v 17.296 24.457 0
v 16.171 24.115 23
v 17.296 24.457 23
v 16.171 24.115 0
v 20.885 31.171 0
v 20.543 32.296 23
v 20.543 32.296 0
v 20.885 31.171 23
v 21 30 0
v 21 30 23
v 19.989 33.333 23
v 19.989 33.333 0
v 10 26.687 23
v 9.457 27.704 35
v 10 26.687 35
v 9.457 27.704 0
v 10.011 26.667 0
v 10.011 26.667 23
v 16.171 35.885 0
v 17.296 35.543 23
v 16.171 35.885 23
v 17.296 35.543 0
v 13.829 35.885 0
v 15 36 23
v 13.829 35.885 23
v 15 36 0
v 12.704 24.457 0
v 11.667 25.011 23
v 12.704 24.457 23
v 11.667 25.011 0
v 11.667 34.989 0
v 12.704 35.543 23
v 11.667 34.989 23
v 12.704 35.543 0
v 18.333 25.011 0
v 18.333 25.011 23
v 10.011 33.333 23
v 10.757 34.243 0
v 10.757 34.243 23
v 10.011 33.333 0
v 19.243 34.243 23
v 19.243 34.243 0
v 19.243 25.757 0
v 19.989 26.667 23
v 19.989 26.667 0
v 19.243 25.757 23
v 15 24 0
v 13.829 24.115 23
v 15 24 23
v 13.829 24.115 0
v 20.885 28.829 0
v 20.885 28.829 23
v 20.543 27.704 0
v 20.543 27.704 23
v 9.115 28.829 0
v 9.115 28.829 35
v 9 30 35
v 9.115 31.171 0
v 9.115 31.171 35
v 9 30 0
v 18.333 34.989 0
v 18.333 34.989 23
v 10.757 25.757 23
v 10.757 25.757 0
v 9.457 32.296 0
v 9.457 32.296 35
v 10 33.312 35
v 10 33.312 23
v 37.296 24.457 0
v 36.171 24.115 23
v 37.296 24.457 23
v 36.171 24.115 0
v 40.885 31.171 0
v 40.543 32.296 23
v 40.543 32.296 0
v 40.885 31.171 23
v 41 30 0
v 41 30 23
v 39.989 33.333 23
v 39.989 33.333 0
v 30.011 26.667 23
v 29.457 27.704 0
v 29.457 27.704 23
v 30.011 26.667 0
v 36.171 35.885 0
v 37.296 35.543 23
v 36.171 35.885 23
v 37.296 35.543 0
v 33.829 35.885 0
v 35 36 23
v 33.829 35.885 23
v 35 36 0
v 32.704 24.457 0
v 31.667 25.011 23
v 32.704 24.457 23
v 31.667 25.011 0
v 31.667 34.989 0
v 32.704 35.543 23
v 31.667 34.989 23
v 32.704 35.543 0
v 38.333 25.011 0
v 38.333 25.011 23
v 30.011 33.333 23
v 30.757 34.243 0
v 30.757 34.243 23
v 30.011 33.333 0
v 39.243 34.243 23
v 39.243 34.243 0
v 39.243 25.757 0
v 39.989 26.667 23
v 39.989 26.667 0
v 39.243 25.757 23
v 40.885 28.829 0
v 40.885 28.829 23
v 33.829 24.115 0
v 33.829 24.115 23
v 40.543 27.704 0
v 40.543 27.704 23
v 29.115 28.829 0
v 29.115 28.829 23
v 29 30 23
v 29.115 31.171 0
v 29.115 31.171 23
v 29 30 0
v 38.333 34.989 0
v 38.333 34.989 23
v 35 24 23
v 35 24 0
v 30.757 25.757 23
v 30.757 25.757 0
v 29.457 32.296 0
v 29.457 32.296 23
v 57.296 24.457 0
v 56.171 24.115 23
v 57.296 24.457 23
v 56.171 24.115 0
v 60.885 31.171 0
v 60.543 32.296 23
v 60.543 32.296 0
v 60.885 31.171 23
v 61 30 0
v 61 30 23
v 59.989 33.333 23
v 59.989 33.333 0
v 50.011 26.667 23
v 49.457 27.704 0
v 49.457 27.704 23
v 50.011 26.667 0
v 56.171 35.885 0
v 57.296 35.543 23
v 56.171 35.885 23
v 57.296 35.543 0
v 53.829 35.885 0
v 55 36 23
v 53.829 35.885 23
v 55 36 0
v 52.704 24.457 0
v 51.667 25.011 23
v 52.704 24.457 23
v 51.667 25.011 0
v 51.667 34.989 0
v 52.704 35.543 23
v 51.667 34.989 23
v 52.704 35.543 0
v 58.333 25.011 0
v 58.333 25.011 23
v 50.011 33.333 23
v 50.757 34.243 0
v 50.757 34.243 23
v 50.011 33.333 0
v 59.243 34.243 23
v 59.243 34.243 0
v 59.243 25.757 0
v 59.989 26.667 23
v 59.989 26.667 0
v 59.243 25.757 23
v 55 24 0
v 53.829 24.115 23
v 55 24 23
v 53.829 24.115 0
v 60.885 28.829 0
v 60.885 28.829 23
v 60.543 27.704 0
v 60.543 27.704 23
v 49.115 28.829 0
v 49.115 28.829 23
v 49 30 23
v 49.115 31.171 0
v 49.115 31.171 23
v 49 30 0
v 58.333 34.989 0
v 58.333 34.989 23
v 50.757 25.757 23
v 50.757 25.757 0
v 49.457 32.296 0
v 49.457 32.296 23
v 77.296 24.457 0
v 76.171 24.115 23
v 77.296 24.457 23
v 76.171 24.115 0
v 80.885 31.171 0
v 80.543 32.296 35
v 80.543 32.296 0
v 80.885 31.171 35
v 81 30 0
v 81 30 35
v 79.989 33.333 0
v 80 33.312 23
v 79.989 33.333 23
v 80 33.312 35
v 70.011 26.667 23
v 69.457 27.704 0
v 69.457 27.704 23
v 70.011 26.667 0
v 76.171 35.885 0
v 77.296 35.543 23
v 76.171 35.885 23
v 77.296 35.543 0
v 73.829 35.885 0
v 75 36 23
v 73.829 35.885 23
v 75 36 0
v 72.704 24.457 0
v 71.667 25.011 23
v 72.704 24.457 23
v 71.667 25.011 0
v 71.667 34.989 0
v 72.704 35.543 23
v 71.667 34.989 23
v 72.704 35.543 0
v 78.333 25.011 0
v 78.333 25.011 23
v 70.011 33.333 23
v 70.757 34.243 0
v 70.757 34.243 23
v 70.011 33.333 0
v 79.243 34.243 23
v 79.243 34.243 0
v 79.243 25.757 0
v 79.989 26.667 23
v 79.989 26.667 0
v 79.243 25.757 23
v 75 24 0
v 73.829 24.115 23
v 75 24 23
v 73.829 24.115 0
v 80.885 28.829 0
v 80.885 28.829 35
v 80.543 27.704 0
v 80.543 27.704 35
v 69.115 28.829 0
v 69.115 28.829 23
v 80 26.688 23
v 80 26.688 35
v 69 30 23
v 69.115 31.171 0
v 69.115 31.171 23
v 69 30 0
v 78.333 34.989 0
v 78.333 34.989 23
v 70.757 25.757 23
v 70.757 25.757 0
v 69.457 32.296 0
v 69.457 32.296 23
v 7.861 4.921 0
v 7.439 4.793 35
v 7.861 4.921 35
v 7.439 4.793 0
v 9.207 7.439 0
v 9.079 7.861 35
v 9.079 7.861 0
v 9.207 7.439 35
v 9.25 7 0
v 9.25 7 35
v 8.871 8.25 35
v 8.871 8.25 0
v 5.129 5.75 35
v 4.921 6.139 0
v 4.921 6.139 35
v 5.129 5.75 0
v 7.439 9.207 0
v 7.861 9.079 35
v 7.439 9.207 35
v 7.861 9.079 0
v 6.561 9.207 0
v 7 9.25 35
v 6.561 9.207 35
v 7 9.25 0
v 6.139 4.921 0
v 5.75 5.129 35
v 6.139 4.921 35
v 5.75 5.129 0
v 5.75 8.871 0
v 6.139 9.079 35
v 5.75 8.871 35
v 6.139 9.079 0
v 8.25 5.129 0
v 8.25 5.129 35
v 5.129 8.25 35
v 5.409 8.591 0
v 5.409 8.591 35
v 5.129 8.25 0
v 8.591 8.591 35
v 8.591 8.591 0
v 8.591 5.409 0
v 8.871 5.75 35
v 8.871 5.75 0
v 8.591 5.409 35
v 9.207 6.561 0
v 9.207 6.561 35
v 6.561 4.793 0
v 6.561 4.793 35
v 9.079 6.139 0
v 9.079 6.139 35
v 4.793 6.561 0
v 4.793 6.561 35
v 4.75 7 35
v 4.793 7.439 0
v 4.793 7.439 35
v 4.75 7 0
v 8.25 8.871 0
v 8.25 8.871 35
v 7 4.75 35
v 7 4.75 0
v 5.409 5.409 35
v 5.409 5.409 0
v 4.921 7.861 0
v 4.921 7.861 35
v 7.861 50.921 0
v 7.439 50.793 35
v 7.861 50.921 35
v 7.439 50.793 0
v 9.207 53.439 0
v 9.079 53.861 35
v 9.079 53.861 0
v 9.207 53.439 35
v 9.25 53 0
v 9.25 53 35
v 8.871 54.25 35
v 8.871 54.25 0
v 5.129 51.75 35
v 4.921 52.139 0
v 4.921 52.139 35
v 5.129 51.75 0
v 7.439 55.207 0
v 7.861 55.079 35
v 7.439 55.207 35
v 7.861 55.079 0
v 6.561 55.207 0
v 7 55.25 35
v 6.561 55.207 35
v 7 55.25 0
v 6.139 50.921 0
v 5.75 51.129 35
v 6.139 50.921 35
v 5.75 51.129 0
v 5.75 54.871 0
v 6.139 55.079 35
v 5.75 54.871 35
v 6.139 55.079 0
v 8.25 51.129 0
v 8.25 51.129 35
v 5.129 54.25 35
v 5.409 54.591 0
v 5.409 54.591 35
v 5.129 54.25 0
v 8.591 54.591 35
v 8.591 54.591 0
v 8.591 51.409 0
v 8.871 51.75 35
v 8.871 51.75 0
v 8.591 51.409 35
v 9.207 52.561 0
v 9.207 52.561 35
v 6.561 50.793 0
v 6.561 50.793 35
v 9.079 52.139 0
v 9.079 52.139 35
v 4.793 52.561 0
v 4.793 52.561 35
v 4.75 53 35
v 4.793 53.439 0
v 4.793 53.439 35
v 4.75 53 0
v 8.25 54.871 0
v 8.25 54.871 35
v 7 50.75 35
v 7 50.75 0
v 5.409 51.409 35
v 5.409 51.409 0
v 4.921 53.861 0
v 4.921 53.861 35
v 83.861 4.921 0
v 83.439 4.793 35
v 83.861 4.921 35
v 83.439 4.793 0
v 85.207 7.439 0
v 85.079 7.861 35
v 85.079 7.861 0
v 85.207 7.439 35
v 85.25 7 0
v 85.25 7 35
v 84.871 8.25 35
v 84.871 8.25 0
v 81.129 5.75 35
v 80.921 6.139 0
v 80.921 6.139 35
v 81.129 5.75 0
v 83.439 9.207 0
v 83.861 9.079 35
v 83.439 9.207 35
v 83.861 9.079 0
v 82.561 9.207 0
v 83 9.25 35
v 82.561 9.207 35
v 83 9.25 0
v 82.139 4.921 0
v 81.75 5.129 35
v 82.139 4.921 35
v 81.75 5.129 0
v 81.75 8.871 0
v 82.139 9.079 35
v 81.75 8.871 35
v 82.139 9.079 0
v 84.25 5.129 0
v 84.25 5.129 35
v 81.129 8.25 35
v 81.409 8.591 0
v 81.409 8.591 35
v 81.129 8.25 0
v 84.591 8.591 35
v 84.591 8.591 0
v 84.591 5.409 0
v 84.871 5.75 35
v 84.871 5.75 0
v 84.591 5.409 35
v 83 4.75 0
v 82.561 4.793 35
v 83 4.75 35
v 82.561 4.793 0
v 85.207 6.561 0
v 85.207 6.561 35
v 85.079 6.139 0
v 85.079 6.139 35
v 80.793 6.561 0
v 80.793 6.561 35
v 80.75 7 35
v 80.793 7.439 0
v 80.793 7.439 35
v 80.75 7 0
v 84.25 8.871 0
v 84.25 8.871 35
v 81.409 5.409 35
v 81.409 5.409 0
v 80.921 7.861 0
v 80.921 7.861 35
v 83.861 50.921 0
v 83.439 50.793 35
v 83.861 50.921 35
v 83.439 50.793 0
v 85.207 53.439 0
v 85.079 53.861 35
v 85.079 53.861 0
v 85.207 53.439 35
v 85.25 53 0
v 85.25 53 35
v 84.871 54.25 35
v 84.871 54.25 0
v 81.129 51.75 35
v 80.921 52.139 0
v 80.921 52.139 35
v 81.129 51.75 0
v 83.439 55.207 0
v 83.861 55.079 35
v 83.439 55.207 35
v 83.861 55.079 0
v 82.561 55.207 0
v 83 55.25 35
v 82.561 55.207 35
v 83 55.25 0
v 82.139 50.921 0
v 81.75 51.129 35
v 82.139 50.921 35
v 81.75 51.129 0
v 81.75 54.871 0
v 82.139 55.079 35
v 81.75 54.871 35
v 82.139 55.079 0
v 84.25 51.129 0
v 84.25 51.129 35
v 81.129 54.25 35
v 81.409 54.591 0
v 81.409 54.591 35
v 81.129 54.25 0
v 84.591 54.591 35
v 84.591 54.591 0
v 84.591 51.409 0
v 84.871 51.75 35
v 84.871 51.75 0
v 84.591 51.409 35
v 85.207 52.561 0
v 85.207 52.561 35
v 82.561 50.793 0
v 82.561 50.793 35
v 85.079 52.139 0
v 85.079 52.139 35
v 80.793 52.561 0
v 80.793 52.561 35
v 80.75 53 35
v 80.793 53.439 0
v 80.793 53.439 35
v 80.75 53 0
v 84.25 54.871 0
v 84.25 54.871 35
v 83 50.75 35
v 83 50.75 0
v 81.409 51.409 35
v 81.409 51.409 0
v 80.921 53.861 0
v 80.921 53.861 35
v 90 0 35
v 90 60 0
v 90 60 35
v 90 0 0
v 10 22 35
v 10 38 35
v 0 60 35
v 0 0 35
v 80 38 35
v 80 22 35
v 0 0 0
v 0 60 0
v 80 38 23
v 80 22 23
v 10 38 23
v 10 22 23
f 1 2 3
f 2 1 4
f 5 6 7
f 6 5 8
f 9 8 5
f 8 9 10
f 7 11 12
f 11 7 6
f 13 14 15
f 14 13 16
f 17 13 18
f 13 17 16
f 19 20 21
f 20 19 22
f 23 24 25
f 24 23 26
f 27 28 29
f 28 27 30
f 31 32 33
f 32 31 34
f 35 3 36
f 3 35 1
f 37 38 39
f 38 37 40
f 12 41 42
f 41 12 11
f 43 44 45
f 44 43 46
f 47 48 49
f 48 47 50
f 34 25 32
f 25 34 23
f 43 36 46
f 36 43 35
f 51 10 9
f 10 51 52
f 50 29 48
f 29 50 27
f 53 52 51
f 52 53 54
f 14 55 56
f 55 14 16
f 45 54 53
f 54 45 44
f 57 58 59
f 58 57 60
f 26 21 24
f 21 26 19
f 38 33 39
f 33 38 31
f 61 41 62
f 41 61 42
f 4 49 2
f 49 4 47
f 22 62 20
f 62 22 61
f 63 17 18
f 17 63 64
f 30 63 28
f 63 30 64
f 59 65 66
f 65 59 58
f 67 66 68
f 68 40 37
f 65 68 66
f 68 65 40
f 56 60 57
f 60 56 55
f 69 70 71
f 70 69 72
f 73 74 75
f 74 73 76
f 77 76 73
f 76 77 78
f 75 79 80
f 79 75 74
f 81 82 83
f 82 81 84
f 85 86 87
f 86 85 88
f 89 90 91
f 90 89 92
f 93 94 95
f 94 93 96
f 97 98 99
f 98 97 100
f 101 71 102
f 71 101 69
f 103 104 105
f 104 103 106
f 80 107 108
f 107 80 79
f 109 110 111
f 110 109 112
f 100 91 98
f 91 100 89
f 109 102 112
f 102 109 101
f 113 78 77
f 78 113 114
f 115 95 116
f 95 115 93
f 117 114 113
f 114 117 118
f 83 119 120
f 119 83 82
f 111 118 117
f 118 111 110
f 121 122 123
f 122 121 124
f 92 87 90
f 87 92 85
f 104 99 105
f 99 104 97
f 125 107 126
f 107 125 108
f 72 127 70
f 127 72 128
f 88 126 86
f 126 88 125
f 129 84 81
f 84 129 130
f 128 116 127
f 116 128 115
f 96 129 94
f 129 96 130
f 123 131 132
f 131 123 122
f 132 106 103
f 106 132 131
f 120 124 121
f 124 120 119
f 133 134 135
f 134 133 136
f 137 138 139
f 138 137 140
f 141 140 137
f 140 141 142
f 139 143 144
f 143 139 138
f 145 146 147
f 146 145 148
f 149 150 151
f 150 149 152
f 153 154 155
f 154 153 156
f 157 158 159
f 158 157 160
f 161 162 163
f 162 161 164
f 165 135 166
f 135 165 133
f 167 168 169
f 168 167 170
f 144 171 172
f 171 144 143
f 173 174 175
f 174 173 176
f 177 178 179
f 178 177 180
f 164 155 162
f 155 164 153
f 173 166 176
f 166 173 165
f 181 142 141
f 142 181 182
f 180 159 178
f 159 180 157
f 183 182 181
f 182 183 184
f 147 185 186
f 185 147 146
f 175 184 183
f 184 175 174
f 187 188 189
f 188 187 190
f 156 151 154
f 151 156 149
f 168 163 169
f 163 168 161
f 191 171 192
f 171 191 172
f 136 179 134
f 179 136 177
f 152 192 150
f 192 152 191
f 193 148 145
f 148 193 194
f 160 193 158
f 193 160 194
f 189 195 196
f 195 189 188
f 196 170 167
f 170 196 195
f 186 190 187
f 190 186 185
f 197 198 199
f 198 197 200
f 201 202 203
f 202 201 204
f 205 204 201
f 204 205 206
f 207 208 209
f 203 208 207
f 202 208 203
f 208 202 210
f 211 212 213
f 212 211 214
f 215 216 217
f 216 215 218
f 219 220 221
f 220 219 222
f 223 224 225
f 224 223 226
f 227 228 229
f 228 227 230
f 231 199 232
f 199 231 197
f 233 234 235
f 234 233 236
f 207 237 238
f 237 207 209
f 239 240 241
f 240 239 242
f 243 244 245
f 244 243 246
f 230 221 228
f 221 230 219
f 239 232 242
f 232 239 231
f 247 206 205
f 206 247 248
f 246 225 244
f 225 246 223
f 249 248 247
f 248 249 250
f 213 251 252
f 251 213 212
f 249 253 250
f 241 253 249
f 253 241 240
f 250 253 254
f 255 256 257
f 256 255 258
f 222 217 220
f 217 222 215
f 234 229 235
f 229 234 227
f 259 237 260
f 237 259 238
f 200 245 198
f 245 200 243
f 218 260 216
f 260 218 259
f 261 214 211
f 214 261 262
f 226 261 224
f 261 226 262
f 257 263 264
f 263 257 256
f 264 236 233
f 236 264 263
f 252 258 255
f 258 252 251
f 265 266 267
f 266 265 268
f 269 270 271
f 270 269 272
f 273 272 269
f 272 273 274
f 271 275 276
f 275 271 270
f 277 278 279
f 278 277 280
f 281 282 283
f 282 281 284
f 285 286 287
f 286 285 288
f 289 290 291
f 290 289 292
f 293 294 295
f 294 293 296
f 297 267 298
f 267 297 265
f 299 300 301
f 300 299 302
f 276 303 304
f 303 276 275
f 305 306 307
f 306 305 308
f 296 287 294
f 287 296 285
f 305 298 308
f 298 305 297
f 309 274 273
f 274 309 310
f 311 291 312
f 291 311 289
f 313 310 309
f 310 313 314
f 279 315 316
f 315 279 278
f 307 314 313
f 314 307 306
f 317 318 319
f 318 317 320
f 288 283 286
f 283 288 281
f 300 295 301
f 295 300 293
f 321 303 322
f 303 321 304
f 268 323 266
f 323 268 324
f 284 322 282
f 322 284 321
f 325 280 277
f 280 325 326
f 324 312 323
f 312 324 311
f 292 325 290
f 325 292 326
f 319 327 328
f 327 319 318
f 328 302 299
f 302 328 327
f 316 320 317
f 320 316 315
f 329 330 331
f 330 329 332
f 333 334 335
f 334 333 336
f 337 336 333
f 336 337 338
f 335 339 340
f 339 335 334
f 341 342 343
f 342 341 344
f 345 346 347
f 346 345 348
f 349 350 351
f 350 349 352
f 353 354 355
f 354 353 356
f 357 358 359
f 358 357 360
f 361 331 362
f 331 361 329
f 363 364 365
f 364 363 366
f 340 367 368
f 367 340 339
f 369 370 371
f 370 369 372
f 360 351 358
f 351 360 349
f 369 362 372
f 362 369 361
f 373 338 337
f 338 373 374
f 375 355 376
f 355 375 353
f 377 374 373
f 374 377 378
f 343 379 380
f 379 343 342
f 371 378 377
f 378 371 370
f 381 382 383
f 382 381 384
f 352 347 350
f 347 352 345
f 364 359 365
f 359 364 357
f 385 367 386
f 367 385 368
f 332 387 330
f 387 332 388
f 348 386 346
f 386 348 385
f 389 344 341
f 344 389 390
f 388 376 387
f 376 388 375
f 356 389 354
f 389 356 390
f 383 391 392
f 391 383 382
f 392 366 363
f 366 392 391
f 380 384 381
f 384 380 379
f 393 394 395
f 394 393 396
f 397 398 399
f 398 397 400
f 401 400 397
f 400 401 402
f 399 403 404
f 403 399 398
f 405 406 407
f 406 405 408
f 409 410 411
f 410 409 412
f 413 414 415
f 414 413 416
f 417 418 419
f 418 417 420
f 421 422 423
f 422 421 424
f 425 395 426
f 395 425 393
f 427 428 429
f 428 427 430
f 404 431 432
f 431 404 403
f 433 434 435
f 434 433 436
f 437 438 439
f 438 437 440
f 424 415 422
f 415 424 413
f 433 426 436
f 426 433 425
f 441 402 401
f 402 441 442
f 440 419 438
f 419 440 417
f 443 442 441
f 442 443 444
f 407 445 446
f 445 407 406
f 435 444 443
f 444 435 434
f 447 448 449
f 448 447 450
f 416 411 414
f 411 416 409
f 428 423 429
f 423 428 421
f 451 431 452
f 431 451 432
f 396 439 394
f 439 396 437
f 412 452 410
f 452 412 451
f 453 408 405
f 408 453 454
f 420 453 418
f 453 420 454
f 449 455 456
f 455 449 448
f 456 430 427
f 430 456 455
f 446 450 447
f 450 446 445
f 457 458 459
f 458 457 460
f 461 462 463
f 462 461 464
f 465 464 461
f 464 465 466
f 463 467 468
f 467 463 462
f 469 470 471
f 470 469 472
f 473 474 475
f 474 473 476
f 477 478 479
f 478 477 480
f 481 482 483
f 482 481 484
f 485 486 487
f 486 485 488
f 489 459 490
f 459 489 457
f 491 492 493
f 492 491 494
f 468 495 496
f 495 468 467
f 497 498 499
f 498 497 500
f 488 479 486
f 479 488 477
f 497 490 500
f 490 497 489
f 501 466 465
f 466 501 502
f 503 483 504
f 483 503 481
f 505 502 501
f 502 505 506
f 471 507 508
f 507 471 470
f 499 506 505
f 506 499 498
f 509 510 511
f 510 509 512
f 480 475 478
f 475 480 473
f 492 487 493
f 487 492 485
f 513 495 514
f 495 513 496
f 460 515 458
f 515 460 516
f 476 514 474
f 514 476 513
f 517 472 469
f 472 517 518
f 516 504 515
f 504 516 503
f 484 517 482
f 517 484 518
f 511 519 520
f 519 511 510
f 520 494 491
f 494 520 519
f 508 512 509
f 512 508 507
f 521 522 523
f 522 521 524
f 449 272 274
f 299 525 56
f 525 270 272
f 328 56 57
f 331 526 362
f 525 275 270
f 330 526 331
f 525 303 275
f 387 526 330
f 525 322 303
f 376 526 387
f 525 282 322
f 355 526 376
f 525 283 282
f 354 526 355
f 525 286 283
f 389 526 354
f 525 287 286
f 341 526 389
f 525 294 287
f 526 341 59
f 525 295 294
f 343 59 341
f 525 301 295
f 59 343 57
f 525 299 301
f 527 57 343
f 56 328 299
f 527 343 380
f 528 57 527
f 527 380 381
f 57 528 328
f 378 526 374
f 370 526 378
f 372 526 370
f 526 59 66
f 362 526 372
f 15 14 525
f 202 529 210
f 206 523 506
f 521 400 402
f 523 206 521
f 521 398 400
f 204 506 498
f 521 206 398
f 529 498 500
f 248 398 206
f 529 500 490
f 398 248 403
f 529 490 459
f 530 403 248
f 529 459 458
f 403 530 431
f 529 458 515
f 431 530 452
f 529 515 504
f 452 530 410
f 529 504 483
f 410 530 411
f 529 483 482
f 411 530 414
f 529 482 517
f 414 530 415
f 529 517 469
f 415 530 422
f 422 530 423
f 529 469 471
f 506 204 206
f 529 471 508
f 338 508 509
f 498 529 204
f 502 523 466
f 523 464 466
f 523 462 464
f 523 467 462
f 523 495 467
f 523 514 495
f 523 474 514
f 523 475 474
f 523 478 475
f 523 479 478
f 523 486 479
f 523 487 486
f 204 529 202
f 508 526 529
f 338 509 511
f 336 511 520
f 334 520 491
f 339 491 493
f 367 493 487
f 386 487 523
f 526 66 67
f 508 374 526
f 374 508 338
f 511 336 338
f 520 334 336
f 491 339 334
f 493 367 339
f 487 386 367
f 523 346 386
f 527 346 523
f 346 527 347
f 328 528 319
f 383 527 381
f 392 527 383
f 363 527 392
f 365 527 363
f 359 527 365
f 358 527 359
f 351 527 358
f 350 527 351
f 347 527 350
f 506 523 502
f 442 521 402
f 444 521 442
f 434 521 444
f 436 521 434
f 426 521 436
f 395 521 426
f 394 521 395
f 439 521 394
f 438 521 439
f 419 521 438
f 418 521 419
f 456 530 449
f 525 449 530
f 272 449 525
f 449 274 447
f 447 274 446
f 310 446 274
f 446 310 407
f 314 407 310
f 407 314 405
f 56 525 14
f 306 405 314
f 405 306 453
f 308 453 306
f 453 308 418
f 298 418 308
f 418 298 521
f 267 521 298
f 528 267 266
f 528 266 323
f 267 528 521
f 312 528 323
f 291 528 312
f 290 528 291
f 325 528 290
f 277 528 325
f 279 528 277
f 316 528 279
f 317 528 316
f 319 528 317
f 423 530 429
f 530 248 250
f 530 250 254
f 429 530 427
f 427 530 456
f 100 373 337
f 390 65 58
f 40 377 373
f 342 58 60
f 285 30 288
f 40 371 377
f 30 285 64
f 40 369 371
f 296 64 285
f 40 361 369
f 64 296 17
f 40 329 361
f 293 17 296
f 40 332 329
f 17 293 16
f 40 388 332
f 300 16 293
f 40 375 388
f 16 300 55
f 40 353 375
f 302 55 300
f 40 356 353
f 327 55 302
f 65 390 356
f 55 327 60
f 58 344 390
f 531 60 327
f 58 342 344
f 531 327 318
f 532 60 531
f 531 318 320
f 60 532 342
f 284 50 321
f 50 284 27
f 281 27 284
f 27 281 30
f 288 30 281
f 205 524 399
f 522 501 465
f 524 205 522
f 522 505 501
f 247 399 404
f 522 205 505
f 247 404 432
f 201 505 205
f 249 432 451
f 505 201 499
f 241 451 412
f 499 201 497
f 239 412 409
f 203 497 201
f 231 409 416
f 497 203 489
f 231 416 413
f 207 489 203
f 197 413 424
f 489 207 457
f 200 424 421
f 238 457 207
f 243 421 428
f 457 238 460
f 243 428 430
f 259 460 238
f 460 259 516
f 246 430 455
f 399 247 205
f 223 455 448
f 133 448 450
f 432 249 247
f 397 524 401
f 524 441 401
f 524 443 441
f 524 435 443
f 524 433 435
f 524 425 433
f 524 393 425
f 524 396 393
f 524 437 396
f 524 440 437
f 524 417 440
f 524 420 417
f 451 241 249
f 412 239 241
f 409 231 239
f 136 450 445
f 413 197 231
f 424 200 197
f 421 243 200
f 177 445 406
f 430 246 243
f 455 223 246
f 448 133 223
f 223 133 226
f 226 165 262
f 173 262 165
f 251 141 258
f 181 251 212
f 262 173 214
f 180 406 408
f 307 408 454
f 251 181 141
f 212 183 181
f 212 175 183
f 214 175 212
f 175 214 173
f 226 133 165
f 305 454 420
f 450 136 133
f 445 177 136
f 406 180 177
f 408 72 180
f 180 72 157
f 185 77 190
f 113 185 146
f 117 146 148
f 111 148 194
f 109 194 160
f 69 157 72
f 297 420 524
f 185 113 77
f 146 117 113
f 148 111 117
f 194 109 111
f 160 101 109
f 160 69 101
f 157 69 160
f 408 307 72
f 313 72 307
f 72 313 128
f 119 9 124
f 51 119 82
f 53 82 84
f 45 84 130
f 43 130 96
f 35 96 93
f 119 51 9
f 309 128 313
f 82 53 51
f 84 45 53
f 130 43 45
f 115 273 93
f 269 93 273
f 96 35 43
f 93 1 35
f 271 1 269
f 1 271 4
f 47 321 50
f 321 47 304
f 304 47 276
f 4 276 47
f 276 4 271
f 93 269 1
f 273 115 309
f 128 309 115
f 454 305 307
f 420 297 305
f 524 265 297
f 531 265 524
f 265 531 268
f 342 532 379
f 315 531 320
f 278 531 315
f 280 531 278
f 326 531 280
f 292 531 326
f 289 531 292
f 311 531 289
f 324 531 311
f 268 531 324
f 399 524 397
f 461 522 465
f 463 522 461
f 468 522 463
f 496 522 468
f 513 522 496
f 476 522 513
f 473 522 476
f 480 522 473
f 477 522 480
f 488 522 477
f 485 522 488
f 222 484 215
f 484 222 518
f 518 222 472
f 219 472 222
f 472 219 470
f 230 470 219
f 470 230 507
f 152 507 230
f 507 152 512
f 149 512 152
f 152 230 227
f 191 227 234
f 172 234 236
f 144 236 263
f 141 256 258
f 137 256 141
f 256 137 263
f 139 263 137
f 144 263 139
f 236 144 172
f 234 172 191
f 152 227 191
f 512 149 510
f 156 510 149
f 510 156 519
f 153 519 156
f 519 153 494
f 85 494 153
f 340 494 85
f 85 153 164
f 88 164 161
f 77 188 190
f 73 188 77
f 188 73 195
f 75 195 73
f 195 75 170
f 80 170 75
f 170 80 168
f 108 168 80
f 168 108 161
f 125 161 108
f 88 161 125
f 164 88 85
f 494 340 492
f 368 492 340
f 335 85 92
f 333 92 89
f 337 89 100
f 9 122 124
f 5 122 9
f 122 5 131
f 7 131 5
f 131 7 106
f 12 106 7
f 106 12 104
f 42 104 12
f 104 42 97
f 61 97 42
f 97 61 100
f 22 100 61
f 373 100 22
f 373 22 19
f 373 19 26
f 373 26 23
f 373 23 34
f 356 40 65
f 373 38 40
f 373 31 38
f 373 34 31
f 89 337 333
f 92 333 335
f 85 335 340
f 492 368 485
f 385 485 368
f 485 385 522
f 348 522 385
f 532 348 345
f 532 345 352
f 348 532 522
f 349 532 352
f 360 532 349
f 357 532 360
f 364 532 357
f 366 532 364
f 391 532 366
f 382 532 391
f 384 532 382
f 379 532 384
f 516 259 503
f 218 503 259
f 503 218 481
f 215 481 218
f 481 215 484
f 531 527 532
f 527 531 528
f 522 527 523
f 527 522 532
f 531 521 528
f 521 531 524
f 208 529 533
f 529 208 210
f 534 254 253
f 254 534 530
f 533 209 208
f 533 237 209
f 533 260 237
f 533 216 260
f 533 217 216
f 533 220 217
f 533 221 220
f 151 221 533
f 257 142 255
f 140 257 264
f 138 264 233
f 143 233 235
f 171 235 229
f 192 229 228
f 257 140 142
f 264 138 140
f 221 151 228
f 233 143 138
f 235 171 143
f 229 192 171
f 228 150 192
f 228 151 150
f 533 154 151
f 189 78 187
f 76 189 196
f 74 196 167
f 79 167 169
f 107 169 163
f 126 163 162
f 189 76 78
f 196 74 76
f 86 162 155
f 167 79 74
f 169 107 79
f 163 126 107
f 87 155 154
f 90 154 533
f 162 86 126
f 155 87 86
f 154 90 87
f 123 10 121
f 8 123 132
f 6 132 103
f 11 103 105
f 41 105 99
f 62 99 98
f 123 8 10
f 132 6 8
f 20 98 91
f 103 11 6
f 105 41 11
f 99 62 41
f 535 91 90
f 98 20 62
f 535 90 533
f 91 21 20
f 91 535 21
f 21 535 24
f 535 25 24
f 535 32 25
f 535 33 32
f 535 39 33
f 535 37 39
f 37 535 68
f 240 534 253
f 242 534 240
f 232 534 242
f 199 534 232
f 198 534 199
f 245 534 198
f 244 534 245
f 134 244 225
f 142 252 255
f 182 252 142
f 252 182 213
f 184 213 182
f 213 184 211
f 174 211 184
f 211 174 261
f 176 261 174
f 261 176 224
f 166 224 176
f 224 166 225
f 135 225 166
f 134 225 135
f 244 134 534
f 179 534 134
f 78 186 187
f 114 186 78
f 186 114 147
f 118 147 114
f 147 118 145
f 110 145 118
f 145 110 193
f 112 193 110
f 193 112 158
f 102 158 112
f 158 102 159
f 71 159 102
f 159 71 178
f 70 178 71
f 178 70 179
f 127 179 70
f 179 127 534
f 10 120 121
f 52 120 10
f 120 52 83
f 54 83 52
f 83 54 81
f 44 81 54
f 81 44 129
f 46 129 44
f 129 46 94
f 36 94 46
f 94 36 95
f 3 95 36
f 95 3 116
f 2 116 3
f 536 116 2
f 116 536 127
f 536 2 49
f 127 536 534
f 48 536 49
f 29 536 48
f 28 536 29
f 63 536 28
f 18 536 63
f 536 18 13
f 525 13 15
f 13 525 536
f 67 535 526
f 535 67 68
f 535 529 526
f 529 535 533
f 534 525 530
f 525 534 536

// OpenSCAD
$fn = 32;

// ----------------------------------------------------------------------
// Manifold block: gallery_top manifold
// ----------------------------------------------------------------------

// --- parameters (mm) ---
block_l = 90;             // block length, X
block_w = 60;             // block width, Y
block_h = 35;             // block height, Z
port_d = 12;              // port bore diameter
port_pitch = 20;          // port pitch along X
gallery_d = 16;           // top gallery width, Y
gallery_depth = 12;       // gallery pocket depth
wall_p = 10;              // gallery end wall thickness, X
mnt_d = 4.5;              // mounting hole diameter
mnt_in = 7;               // mounting hole inset from the edges

n_ports = 4;  // ports in the row
port_x0 = (block_l - (n_ports - 1) * port_pitch) / 2;  // first port X

difference() {
  cube([block_l, block_w, block_h]);
  for (i = [0 : n_ports - 1])
    translate([port_x0 + i * port_pitch, block_w / 2, -1])
      cylinder(h = block_h + 2, d = port_d);
  translate([wall_p, block_w / 2 - gallery_d / 2, block_h - gallery_depth])
    cube([block_l - 2 * wall_p, gallery_d, gallery_depth + 1]);
  for (cx = [mnt_in, block_l - mnt_in])
    for (cy = [mnt_in, block_w - mnt_in])
      translate([cx, cy, -1]) cylinder(h = block_h + 2, d = mnt_d);
}
